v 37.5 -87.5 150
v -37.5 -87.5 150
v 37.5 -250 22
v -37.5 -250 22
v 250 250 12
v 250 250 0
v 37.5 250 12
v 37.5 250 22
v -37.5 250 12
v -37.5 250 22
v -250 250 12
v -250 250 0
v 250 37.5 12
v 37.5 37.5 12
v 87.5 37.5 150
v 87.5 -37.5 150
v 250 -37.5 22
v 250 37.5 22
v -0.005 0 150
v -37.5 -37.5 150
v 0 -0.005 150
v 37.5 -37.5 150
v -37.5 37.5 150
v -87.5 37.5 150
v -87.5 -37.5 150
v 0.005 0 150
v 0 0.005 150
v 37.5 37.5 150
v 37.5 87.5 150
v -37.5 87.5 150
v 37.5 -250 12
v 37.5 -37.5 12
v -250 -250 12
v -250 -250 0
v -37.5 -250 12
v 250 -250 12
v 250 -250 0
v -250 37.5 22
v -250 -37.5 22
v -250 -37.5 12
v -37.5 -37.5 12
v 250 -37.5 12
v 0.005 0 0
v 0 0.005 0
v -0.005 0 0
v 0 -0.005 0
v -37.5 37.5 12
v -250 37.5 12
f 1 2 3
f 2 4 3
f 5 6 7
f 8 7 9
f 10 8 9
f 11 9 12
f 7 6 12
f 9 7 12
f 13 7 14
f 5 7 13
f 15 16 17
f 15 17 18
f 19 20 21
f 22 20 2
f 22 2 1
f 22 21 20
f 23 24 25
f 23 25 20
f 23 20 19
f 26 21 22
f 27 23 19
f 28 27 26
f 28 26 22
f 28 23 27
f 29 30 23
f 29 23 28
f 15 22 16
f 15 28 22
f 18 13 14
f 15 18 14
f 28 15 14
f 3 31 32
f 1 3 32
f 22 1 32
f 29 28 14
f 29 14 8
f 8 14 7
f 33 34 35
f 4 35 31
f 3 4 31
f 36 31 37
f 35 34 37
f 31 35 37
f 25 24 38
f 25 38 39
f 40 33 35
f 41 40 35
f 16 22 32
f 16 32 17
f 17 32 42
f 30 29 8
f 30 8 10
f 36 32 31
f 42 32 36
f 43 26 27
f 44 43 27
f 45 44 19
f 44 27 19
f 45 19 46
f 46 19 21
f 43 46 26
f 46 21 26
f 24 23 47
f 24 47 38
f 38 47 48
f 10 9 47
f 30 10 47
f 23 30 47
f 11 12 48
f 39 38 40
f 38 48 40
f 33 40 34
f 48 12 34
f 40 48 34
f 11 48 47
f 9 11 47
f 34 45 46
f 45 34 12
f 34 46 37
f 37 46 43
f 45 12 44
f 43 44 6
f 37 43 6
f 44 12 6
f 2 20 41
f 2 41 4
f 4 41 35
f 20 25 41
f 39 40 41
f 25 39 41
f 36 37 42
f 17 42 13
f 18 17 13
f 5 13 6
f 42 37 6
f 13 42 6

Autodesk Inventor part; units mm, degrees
ref_plane "YZ Plane" through (0, 0, 0) normal (1, 0, 0) x (0, 1, 0)
ref_plane "XZ Plane" through (0, 0, 0) normal (0, 1, 0) x (-1, 0, 0)
ref_plane "XY Plane" through (0, 0, 0) normal (0, 0, 1) x (1, 0, 0)
sketch "スケッチ1" plane through (0, 0, 0) normal (0, 0, 1) x (1, 0, 0)
  line L0 (250, 250) -> (250, -250)
  line L1 (250, -250) -> (-250, -250)
  line L2 (-250, -250) -> (-250, 250)
  line L3 (-250, 250) -> (250, 250)
  point P0 (0, 0)
  point P1 (0, 0)
  dimension "d0" = 500
extrude "押し出し1" add sketch "スケッチ1" along normal blind 12
sketch "スケッチ2" plane through (0, 0, 12) normal (0, 0, 1) x (1, 0, 0)
  line L0 (250, -250) -> (250, 250) projected
  line L1 (250, 250) -> (-250, 250) projected
  line L2 (-250, 250) -> (-250, -250) projected
  line L3 (-250, -250) -> (250, -250) projected
  line L4 (-250, -250) -> (-37.5, -250)
  line L5 (-250, -250) -> (250, -250) projected
  line L6 (-37.5, -250) -> (37.5, -250)
  line L7 (-37.5, -250) -> (-37.5, 250)
  line L8 (37.5, -250) -> (37.5, 250)
  line L9 (250, 250) -> (-250, 250) projected
  line L10 (-250, -250) -> (-250, -37.5)
  line L11 (-250, 250) -> (-250, -250) projected
  line L12 (-250, -37.5) -> (250, -37.5)
  line L13 (-250, -37.5) -> (-250, 37.5)
  line L14 (-250, 37.5) -> (250, 37.5)
  point P0 (0, 0)
  dimension "d3" = 212.5
  dimension "d4" = 75
  dimension "d5" = 212.5
  dimension "d6" = 75
extrude "押し出し2" add sketch "スケッチ2" along normal blind 10 contours L12 L8 L14 L0 | L3 L7 L12 L8 | L12 L7 L14 L8 | L14 L7 L1 L8 | L12 L2 L14 L7
sketch "スケッチ3" plane through (0, 0, 22) normal (0, 0, 1) x (1, 0, 0)
  line L0 (-37.5, -37.5) -> (-37.5, -250) projected
  line L1 (-37.5, -250) -> (37.5, -250) projected
  line L2 (37.5, -250) -> (37.5, -37.5) projected
  line L3 (37.5, -37.5) -> (250, -37.5) projected
  line L4 (250, -37.5) -> (250, 37.5) projected
  line L5 (250, 37.5) -> (37.5, 37.5) projected
  line L6 (37.5, 37.5) -> (37.5, 250) projected
  line L7 (37.5, 250) -> (-37.5, 250) projected
  line L8 (-37.5, 250) -> (-37.5, 37.5) projected
  line L9 (-37.5, 37.5) -> (-250, 37.5) projected
  line L10 (-250, 37.5) -> (-250, -37.5) projected
  line L11 (-250, -37.5) -> (-37.5, -37.5) projected
  point P0 (0, 0)
extrude "押し出し3" add sketch "スケッチ3" along normal blind 128
chamfer "面取り1" distance 162.5 distance2 128 1 edges at (-250, 0, 150) measured on face at (12.5, 179.1667, 150)
chamfer "面取り2" distance 162.5 distance2 128 1 edges at (0, -250, 150) measured on face at (12.5, 179.1667, 150)
chamfer "面取り3" distance 162.5 distance2 128 1 edges at (0, 250, 150) measured on face at (12.5, 108.3333, 150)
chamfer "面取り4" distance 162.5 distance2 128 1 edges at (250, 0, 150) measured on face at (108.3333, -12.5, 150)
sketch "スケッチ4" plane through (0, 0, 150) normal (0, 0, 1) x (1, 0, 0)
  circle A0 centre (0, 0) radius 0.005
  dimension "d23" = 0.01
extrude "押し出し4" cut sketch "スケッチ4" against normal through all
properties part number "障害物、山"
